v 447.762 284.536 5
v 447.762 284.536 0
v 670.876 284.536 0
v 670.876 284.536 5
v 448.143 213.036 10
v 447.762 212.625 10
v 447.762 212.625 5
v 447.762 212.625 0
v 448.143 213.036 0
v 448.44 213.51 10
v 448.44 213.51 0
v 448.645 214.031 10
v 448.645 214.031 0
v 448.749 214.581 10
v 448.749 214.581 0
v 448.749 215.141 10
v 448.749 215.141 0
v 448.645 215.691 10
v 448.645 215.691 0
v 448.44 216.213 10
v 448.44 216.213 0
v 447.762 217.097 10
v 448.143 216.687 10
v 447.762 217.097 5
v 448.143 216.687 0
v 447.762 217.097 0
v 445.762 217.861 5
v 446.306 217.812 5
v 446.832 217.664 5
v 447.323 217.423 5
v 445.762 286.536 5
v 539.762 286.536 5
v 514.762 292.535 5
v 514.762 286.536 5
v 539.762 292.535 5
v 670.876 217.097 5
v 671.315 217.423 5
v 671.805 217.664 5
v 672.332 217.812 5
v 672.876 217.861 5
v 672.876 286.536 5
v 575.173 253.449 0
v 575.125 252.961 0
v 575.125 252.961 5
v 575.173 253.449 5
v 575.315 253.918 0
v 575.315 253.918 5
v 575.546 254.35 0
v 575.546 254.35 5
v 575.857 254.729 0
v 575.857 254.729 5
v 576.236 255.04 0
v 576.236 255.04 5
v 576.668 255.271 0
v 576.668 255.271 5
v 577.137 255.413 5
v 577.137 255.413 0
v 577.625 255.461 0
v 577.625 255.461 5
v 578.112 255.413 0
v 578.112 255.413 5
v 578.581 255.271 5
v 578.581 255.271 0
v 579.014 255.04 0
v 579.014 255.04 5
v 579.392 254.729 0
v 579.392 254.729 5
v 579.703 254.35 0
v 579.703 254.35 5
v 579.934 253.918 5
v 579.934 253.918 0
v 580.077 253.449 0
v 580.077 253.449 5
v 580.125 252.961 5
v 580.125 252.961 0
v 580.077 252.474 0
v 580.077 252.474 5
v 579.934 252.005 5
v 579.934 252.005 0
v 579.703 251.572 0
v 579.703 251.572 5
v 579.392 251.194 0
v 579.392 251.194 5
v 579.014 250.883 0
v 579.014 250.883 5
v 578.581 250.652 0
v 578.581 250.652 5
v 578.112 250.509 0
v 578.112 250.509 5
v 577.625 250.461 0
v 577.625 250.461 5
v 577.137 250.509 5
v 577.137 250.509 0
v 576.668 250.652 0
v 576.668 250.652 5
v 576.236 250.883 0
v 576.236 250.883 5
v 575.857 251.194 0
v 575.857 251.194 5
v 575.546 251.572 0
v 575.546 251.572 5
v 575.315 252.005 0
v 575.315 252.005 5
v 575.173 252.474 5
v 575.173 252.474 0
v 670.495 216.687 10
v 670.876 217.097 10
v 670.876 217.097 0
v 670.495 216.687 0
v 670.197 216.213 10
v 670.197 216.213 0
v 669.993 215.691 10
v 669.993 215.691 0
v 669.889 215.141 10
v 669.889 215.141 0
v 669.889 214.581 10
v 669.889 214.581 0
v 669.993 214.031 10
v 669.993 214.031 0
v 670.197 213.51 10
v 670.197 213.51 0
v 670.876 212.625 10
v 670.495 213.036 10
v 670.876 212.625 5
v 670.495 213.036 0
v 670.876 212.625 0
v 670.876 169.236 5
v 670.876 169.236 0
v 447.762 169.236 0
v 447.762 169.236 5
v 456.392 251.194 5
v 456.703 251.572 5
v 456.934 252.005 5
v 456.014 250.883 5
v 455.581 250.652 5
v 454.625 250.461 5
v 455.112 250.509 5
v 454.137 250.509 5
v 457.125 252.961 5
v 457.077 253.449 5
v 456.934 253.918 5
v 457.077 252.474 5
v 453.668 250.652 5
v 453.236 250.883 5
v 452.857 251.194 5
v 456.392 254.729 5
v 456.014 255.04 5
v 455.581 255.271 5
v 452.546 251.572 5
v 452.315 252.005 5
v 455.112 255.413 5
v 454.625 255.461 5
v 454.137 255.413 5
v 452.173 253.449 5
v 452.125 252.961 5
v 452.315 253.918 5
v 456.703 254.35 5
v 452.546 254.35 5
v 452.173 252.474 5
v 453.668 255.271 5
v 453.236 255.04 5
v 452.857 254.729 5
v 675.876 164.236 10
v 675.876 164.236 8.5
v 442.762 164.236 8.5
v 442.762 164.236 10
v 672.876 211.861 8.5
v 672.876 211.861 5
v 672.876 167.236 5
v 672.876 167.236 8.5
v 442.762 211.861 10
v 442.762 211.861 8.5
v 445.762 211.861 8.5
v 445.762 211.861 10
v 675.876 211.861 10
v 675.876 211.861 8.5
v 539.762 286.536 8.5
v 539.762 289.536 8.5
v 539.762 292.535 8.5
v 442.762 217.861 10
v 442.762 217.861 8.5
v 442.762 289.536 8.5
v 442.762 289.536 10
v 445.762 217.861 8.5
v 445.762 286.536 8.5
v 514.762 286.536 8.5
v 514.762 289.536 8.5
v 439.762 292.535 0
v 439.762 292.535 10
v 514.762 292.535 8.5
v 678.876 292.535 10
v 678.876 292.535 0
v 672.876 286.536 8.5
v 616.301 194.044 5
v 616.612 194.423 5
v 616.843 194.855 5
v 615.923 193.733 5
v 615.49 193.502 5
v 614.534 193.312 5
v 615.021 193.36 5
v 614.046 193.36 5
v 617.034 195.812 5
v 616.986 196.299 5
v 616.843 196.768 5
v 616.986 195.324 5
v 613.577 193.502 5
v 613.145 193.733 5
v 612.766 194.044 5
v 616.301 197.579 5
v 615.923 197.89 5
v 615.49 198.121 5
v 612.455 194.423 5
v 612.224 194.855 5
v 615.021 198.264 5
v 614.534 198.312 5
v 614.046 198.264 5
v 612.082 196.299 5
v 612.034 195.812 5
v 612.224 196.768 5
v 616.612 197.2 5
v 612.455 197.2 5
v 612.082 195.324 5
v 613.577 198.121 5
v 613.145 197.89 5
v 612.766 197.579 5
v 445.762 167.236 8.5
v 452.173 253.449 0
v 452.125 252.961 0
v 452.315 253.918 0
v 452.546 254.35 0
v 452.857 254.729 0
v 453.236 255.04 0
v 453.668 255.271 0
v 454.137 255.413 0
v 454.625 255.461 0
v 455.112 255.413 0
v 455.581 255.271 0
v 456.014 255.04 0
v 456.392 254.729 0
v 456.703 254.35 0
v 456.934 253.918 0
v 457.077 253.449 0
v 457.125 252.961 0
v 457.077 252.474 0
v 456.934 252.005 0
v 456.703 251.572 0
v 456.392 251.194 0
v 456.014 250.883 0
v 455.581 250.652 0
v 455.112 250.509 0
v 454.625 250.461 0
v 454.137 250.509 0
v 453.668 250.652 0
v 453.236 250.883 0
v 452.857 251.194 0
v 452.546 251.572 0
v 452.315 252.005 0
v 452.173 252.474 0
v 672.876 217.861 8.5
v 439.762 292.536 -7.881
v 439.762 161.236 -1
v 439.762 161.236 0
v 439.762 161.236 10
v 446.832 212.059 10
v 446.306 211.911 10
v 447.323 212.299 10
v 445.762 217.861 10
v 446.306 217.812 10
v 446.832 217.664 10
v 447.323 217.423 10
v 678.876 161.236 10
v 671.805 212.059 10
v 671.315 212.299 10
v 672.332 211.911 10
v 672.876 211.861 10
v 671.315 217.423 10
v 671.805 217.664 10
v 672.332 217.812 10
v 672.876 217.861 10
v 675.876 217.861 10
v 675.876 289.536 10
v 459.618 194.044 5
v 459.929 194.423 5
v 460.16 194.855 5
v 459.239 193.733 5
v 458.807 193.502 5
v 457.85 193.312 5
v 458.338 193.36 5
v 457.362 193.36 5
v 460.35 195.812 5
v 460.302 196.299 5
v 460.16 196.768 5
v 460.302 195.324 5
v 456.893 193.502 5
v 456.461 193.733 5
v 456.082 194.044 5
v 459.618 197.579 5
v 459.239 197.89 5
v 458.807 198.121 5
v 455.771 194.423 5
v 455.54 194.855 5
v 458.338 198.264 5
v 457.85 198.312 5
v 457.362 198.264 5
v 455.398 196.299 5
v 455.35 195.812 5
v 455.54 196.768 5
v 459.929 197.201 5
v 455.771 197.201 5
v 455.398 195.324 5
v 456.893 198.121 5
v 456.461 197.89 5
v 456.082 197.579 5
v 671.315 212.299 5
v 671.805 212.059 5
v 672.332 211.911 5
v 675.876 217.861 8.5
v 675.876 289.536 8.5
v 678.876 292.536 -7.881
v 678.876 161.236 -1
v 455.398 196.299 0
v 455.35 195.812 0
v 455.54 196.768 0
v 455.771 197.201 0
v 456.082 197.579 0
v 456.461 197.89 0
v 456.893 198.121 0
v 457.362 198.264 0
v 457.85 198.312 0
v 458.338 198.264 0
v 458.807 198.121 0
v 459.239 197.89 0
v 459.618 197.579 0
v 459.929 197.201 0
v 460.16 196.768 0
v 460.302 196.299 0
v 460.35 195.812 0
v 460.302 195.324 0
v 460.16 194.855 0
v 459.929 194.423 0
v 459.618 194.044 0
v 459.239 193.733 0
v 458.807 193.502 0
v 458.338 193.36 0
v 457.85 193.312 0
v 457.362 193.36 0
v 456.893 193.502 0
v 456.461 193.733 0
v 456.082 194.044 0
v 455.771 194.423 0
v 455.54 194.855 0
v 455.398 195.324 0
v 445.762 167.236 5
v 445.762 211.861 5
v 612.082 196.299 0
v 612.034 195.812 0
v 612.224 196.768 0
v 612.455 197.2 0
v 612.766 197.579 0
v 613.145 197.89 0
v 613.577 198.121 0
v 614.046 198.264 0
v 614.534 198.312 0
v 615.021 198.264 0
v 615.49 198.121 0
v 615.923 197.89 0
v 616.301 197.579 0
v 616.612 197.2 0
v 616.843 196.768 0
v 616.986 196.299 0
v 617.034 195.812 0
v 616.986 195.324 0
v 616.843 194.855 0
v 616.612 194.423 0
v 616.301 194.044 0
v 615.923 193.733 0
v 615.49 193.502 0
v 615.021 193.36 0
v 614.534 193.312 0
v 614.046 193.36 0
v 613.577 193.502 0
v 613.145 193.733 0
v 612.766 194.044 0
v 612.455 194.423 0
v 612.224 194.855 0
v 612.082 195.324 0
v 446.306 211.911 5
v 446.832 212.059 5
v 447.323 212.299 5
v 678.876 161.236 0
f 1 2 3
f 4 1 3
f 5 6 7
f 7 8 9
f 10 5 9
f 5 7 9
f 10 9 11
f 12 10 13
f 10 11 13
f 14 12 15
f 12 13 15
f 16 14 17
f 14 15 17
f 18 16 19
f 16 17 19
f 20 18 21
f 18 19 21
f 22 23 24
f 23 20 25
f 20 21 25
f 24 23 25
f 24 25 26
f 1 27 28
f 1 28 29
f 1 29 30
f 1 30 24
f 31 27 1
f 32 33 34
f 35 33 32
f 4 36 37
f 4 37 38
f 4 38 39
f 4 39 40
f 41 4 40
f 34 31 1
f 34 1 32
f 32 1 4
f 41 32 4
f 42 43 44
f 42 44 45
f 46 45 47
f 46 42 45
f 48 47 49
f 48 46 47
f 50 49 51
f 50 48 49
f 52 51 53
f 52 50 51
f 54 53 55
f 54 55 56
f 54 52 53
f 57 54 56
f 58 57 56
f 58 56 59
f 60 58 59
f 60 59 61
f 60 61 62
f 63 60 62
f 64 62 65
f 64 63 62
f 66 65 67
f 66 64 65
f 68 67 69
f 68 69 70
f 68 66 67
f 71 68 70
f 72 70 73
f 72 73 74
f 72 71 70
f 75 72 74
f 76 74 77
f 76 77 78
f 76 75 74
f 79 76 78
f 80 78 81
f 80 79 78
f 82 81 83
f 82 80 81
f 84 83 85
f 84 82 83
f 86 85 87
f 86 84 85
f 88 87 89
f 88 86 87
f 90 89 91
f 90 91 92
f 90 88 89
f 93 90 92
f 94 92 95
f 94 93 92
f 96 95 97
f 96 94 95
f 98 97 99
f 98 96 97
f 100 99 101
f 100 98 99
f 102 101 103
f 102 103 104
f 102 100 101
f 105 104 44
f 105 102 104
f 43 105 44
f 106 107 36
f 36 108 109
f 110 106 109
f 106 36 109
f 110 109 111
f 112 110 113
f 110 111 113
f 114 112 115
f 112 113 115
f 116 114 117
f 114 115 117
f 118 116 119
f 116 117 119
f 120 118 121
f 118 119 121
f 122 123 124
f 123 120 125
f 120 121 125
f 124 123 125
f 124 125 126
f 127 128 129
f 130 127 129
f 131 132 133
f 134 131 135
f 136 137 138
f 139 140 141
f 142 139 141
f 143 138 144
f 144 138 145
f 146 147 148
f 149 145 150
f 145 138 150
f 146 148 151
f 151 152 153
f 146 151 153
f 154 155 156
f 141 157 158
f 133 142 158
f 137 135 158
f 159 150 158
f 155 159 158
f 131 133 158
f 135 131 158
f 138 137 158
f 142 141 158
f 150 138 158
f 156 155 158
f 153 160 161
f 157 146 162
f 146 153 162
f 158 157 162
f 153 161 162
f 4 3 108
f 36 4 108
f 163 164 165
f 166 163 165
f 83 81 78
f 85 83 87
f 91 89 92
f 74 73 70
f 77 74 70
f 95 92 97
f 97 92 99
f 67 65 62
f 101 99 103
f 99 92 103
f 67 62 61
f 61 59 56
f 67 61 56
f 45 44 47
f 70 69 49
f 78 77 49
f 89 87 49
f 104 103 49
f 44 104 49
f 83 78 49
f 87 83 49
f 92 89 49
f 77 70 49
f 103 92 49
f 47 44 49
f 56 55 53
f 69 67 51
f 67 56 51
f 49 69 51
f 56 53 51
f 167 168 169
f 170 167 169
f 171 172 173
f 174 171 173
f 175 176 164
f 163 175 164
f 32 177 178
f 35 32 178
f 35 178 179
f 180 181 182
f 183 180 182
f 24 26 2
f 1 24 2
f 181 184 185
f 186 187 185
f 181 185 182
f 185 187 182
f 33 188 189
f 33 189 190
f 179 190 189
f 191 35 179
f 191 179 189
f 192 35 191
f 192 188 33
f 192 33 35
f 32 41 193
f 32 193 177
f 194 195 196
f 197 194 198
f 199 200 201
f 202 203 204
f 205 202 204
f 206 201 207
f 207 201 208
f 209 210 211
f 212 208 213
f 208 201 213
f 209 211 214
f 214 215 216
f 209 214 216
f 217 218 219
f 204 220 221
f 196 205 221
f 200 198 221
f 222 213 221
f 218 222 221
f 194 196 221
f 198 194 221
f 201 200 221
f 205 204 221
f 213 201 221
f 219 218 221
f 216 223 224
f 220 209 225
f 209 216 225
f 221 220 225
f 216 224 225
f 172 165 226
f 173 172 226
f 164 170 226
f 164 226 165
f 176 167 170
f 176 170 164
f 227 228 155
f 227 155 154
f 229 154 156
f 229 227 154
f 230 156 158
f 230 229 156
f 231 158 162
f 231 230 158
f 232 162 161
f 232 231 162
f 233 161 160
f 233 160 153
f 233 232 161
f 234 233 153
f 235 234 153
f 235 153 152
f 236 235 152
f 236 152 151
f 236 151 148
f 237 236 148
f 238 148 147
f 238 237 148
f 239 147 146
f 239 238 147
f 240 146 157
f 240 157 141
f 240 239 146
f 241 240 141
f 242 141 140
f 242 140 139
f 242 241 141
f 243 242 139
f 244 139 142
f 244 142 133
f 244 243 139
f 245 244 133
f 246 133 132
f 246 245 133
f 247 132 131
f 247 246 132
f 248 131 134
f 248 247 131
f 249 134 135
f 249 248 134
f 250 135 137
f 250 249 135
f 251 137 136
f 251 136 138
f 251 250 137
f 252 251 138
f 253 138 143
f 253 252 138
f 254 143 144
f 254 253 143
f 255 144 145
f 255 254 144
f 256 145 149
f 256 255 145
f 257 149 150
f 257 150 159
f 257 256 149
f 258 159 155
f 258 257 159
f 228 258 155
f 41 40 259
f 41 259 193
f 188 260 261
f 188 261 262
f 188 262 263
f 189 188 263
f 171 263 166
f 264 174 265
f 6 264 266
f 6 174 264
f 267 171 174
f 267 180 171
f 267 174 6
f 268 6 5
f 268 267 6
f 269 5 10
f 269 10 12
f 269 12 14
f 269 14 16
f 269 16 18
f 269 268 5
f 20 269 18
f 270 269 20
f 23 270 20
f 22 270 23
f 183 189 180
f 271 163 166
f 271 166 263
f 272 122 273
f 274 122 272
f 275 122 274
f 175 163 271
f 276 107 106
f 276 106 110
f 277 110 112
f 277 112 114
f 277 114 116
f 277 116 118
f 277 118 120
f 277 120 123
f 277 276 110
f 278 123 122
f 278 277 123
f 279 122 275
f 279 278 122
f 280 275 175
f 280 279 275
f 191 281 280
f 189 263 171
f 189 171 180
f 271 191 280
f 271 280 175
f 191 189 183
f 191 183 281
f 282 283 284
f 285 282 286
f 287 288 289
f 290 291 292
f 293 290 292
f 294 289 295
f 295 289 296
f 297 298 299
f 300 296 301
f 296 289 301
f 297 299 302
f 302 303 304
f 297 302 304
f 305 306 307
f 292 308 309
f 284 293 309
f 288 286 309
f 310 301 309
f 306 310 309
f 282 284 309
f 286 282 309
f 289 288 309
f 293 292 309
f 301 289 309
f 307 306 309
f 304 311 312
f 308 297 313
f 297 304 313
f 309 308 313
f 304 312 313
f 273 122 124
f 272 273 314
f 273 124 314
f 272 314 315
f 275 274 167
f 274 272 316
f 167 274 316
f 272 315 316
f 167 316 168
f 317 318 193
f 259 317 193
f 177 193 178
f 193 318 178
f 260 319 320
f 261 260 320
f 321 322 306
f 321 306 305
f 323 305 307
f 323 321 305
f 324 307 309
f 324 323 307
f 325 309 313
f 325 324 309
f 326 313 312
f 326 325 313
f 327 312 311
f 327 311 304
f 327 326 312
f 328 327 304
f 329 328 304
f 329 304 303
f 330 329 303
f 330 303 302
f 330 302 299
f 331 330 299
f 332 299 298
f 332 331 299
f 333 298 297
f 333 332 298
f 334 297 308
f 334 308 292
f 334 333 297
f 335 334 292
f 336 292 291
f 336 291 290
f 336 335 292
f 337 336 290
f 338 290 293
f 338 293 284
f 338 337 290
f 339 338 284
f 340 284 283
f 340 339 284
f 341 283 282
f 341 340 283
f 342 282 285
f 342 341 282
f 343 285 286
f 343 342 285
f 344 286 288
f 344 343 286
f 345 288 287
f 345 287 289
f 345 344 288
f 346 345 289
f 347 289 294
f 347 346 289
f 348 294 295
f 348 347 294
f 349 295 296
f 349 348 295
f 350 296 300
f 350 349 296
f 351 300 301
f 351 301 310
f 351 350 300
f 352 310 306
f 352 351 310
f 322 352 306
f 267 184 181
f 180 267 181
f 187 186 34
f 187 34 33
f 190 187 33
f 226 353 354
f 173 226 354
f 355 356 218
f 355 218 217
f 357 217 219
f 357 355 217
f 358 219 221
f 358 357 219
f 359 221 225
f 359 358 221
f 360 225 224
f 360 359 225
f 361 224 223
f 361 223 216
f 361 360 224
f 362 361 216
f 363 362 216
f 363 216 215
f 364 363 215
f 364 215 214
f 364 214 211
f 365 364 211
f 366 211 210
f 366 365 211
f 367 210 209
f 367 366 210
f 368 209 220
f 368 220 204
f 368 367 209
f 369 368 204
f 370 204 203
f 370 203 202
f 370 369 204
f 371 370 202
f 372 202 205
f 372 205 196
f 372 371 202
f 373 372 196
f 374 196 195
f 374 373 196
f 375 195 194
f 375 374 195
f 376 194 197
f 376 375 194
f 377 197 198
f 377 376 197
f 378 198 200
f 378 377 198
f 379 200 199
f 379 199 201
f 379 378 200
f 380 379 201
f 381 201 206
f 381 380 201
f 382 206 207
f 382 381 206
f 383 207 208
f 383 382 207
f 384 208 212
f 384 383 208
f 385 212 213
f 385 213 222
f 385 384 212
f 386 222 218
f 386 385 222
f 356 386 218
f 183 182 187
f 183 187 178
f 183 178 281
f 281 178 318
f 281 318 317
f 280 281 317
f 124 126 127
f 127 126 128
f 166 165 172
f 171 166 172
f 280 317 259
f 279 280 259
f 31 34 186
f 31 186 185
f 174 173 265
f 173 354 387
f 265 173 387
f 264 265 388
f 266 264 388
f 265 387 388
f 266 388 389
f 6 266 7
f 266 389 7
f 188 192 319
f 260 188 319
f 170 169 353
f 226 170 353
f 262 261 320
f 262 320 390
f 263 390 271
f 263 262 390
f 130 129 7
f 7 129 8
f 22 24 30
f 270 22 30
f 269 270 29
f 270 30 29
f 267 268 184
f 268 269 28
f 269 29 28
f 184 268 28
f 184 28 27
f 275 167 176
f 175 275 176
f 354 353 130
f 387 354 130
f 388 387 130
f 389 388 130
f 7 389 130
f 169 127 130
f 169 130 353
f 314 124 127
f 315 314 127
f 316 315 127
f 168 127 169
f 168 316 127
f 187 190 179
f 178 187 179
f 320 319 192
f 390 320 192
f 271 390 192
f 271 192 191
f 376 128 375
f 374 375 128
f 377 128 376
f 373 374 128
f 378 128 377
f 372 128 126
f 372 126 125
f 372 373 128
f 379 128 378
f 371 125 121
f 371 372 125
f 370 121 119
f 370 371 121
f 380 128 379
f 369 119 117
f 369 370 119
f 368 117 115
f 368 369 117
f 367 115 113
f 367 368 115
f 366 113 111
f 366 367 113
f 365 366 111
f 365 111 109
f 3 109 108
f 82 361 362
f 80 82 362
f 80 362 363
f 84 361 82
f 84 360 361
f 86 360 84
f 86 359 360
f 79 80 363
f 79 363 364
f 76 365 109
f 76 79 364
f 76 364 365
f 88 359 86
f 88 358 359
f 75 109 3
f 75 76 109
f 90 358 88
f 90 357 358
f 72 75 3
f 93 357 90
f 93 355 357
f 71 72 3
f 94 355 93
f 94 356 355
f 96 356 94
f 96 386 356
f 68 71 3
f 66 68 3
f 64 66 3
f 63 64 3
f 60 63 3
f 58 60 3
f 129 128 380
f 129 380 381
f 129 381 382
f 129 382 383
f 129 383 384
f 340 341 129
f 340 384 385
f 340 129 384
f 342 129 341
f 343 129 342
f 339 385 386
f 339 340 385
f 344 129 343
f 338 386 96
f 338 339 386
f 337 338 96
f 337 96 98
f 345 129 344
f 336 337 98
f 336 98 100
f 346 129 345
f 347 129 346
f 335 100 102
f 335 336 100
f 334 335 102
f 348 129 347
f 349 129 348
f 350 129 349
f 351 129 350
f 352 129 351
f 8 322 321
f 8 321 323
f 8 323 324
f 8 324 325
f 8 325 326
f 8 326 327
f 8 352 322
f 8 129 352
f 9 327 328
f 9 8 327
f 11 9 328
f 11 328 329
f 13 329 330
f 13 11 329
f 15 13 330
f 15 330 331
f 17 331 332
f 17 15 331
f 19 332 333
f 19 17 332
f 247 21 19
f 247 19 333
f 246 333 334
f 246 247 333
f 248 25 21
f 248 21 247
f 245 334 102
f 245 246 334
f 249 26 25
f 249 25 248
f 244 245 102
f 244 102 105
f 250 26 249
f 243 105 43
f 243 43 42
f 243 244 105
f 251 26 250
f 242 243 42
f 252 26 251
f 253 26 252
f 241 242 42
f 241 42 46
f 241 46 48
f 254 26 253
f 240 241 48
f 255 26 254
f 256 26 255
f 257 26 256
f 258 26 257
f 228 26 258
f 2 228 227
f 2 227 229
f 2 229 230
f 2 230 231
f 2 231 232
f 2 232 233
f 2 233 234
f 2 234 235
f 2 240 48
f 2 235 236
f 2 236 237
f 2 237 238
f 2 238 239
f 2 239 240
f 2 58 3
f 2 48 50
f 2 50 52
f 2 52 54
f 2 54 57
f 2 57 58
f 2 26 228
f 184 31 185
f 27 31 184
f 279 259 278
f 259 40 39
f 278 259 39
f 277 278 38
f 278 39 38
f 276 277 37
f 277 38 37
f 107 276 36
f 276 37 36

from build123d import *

# Parameters (mm, degrees)
MODEL_W             = 239.114
MODEL_H             = 131.298938207
EXTRUDE_2_DEPTH     = 10
EXTRUDE_3_DEPTH     = 8.5
EXTRUDE_4_DEPTH     = 5
SKETCH_3_R          = 2.5
EXTRUDE_5_DEPTH     = 5
EXTRUDE_5_2_DEPTH   = 5
EXTRUDE_5_3_DEPTH   = 5
EXTRUDE_5_4_DEPTH   = 5
EXTRUDE_6_DEPTH     = 239.114
SKETCH_5_W          = 25
SKETCH_5_H          = 5.998631207
CUT_EXTRUDE_1_DEPTH = 3.5


with BuildPart() as part:
    # Model → 凸台-拉伸2 (new body)
    with BuildSketch(Plane.XY):
        with Locations((559.31883528, 226.885059923)):
            Rectangle(MODEL_W, MODEL_H)
        with BuildLine():
            Line((442.76183528, 289.535897819), (675.87583528, 289.535897819))
            Line((675.87583528, 289.535897819), (675.87583528, 217.861297819))
            Line((675.87583528, 217.861297819), (672.87583528, 217.861297819))
            ThreePointArc((672.87583528, 217.861297819), (671.805369011, 217.663814896), (670.87583528, 217.097365797))
            ThreePointArc((670.87583528, 217.097365797), (669.87583528, 214.861297819), (670.87583528, 212.625229842))
            ThreePointArc((670.87583528, 212.625229842), (671.805369011, 212.058780742), (672.87583528, 211.861297819))
            Line((672.87583528, 211.861297819), (675.87583528, 211.861297819))
            Line((675.87583528, 211.861297819), (675.87583528, 164.235590819))
            Line((675.87583528, 164.235590819), (442.76183528, 164.235590819))
            Line((442.76183528, 164.235590819), (442.76183528, 211.861297819))
            Line((442.76183528, 211.861297819), (445.76183528, 211.861297819))
            ThreePointArc((445.76183528, 211.861297819), (446.832301549, 212.058780742), (447.76183528, 212.625229842))
            ThreePointArc((447.76183528, 212.625229842), (448.76183528, 214.861297819), (447.76183528, 217.097365797))
            ThreePointArc((447.76183528, 217.097365797), (446.832301549, 217.663814896), (445.76183528, 217.861297819))
            Line((445.76183528, 217.861297819), (442.76183528, 217.861297819))
            Line((442.76183528, 217.861297819), (442.76183528, 289.535897819))
        make_face(mode=Mode.SUBTRACT)
    extrude(amount=EXTRUDE_2_DEPTH)

    # Model<4> → 凸台-拉伸3 (add)
    with BuildSketch(Plane.XY):
        Polygon((445.76183528, 167.235590819), (445.76183528, 211.861297819), (442.76183528, 211.861297819), (442.76183528, 164.235590819), (675.87583528, 164.235590819), (675.87583528, 211.861297819), (672.87583528, 211.861297819), (672.87583528, 167.235590819), align=None)
        Polygon((442.76183528, 217.861297819), (442.76183528, 289.535897819), (675.87583528, 289.535897819), (675.87583528, 217.861297819), (672.87583528, 217.861297819), (672.87583528, 286.535897819), (445.76183528, 286.535897819), (445.76183528, 217.861297819), align=None)
    extrude(amount=EXTRUDE_3_DEPTH)

    # Model<5> → 凸台-拉伸4 (add)
    with BuildSketch(Plane.XY):
        with BuildLine():
            ThreePointArc((672.87583528, 211.861297819), (671.805369011, 212.058780742), (670.87583528, 212.625229842))
            Line((670.87583528, 212.625229842), (670.87583528, 169.235590819))
            Line((670.87583528, 169.235590819), (447.76183528, 169.235590819))
            Line((447.76183528, 169.235590819), (447.76183528, 212.625229842))
            ThreePointArc((447.76183528, 212.625229842), (446.832301549, 212.058780742), (445.76183528, 211.861297819))
            Line((445.76183528, 211.861297819), (445.76183528, 167.235590819))
            Line((445.76183528, 167.235590819), (672.87583528, 167.235590819))
            Line((672.87583528, 167.235590819), (672.87583528, 211.861297819))
        make_face()
        with BuildLine():
            ThreePointArc((670.87583528, 217.097365797), (671.805369011, 217.663814896), (672.87583528, 217.861297819))
            Line((672.87583528, 217.861297819), (672.87583528, 286.535897819))
            Line((672.87583528, 286.535897819), (539.76183528, 286.535897819))
            Line((539.76183528, 286.535897819), (514.76183528, 286.535897819))
            Line((514.76183528, 286.535897819), (445.76183528, 286.535897819))
            Line((445.76183528, 286.535897819), (445.76183528, 217.861297819))
            ThreePointArc((445.76183528, 217.861297819), (446.832301549, 217.663814896), (447.76183528, 217.097365797))
            Line((447.76183528, 217.097365797), (447.76183528, 284.535897819))
            Line((447.76183528, 284.535897819), (670.87583528, 284.535897819))
            Line((670.87583528, 284.535897819), (670.87583528, 217.097365797))
        make_face()
    extrude(amount=EXTRUDE_4_DEPTH)



with BuildPart() as body_2:
    # 草图3 → 凸台-拉伸5 (new body)
    with BuildSketch(Plane(origin=(0, 0, 0), x_dir=(-1, 0, 0), z_dir=(0, 0, -1))):
        with Locations((-577.62472278, 252.961297819)):
            Circle(SKETCH_3_R)
    extrude(amount=-EXTRUDE_5_DEPTH)


with BuildPart() as body_3:
    # 草图3 → Extrude 5 2 (new body)
    with BuildSketch(Plane(origin=(0, 0, 0), x_dir=(-1, 0, 0), z_dir=(0, 0, -1))):
        with Locations((-614.53372278, 195.811572819)):
            Circle(SKETCH_3_R)
    extrude(amount=-EXTRUDE_5_2_DEPTH)


with BuildPart() as body_4:
    # 草图3 → Extrude 5 3 (new body)
    with BuildSketch(Plane(origin=(0, 0, 0), x_dir=(-1, 0, 0), z_dir=(0, 0, -1))):
        with Locations((-457.84983528, 195.811597819)):
            Circle(SKETCH_3_R)
    extrude(amount=-EXTRUDE_5_3_DEPTH)


with BuildPart() as body_5:
    # 草图3 → Extrude 5 4 (new body)
    with BuildSketch(Plane(origin=(0, 0, 0), x_dir=(-1, 0, 0), z_dir=(0, 0, -1))):
        with Locations((-454.62472278, 252.961297819)):
            Circle(SKETCH_3_R)
    extrude(amount=-EXTRUDE_5_4_DEPTH)


with BuildPart() as part_1:
    add(part.part)

    add(body_2.part)  # 凸台-拉伸6 merges body 2

    add(body_3.part)  # 凸台-拉伸6 merges body 3

    add(body_4.part)  # 凸台-拉伸6 merges body 4

    add(body_5.part)  # 凸台-拉伸6 merges body 5
    # 草图4 → 凸台-拉伸6 (add)
    with BuildSketch(Plane.ZY.offset(-439.76183528)):
        Polygon((-7.881170053, 292.536137164), (-1, 161.235590819), (0, 161.235590819), (0, 292.534529026), align=None)
    extrude(amount=-EXTRUDE_6_DEPTH)

    # 草图5 → 切除-拉伸1 (cut)
    with BuildSketch(Plane.XY.offset(8.5)):
        with Locations((527.26183528, 289.535213423)):
            Rectangle(SKETCH_5_W, SKETCH_5_H)
    extrude(amount=-CUT_EXTRUDE_1_DEPTH, mode=Mode.SUBTRACT)


solid = part_1.part
